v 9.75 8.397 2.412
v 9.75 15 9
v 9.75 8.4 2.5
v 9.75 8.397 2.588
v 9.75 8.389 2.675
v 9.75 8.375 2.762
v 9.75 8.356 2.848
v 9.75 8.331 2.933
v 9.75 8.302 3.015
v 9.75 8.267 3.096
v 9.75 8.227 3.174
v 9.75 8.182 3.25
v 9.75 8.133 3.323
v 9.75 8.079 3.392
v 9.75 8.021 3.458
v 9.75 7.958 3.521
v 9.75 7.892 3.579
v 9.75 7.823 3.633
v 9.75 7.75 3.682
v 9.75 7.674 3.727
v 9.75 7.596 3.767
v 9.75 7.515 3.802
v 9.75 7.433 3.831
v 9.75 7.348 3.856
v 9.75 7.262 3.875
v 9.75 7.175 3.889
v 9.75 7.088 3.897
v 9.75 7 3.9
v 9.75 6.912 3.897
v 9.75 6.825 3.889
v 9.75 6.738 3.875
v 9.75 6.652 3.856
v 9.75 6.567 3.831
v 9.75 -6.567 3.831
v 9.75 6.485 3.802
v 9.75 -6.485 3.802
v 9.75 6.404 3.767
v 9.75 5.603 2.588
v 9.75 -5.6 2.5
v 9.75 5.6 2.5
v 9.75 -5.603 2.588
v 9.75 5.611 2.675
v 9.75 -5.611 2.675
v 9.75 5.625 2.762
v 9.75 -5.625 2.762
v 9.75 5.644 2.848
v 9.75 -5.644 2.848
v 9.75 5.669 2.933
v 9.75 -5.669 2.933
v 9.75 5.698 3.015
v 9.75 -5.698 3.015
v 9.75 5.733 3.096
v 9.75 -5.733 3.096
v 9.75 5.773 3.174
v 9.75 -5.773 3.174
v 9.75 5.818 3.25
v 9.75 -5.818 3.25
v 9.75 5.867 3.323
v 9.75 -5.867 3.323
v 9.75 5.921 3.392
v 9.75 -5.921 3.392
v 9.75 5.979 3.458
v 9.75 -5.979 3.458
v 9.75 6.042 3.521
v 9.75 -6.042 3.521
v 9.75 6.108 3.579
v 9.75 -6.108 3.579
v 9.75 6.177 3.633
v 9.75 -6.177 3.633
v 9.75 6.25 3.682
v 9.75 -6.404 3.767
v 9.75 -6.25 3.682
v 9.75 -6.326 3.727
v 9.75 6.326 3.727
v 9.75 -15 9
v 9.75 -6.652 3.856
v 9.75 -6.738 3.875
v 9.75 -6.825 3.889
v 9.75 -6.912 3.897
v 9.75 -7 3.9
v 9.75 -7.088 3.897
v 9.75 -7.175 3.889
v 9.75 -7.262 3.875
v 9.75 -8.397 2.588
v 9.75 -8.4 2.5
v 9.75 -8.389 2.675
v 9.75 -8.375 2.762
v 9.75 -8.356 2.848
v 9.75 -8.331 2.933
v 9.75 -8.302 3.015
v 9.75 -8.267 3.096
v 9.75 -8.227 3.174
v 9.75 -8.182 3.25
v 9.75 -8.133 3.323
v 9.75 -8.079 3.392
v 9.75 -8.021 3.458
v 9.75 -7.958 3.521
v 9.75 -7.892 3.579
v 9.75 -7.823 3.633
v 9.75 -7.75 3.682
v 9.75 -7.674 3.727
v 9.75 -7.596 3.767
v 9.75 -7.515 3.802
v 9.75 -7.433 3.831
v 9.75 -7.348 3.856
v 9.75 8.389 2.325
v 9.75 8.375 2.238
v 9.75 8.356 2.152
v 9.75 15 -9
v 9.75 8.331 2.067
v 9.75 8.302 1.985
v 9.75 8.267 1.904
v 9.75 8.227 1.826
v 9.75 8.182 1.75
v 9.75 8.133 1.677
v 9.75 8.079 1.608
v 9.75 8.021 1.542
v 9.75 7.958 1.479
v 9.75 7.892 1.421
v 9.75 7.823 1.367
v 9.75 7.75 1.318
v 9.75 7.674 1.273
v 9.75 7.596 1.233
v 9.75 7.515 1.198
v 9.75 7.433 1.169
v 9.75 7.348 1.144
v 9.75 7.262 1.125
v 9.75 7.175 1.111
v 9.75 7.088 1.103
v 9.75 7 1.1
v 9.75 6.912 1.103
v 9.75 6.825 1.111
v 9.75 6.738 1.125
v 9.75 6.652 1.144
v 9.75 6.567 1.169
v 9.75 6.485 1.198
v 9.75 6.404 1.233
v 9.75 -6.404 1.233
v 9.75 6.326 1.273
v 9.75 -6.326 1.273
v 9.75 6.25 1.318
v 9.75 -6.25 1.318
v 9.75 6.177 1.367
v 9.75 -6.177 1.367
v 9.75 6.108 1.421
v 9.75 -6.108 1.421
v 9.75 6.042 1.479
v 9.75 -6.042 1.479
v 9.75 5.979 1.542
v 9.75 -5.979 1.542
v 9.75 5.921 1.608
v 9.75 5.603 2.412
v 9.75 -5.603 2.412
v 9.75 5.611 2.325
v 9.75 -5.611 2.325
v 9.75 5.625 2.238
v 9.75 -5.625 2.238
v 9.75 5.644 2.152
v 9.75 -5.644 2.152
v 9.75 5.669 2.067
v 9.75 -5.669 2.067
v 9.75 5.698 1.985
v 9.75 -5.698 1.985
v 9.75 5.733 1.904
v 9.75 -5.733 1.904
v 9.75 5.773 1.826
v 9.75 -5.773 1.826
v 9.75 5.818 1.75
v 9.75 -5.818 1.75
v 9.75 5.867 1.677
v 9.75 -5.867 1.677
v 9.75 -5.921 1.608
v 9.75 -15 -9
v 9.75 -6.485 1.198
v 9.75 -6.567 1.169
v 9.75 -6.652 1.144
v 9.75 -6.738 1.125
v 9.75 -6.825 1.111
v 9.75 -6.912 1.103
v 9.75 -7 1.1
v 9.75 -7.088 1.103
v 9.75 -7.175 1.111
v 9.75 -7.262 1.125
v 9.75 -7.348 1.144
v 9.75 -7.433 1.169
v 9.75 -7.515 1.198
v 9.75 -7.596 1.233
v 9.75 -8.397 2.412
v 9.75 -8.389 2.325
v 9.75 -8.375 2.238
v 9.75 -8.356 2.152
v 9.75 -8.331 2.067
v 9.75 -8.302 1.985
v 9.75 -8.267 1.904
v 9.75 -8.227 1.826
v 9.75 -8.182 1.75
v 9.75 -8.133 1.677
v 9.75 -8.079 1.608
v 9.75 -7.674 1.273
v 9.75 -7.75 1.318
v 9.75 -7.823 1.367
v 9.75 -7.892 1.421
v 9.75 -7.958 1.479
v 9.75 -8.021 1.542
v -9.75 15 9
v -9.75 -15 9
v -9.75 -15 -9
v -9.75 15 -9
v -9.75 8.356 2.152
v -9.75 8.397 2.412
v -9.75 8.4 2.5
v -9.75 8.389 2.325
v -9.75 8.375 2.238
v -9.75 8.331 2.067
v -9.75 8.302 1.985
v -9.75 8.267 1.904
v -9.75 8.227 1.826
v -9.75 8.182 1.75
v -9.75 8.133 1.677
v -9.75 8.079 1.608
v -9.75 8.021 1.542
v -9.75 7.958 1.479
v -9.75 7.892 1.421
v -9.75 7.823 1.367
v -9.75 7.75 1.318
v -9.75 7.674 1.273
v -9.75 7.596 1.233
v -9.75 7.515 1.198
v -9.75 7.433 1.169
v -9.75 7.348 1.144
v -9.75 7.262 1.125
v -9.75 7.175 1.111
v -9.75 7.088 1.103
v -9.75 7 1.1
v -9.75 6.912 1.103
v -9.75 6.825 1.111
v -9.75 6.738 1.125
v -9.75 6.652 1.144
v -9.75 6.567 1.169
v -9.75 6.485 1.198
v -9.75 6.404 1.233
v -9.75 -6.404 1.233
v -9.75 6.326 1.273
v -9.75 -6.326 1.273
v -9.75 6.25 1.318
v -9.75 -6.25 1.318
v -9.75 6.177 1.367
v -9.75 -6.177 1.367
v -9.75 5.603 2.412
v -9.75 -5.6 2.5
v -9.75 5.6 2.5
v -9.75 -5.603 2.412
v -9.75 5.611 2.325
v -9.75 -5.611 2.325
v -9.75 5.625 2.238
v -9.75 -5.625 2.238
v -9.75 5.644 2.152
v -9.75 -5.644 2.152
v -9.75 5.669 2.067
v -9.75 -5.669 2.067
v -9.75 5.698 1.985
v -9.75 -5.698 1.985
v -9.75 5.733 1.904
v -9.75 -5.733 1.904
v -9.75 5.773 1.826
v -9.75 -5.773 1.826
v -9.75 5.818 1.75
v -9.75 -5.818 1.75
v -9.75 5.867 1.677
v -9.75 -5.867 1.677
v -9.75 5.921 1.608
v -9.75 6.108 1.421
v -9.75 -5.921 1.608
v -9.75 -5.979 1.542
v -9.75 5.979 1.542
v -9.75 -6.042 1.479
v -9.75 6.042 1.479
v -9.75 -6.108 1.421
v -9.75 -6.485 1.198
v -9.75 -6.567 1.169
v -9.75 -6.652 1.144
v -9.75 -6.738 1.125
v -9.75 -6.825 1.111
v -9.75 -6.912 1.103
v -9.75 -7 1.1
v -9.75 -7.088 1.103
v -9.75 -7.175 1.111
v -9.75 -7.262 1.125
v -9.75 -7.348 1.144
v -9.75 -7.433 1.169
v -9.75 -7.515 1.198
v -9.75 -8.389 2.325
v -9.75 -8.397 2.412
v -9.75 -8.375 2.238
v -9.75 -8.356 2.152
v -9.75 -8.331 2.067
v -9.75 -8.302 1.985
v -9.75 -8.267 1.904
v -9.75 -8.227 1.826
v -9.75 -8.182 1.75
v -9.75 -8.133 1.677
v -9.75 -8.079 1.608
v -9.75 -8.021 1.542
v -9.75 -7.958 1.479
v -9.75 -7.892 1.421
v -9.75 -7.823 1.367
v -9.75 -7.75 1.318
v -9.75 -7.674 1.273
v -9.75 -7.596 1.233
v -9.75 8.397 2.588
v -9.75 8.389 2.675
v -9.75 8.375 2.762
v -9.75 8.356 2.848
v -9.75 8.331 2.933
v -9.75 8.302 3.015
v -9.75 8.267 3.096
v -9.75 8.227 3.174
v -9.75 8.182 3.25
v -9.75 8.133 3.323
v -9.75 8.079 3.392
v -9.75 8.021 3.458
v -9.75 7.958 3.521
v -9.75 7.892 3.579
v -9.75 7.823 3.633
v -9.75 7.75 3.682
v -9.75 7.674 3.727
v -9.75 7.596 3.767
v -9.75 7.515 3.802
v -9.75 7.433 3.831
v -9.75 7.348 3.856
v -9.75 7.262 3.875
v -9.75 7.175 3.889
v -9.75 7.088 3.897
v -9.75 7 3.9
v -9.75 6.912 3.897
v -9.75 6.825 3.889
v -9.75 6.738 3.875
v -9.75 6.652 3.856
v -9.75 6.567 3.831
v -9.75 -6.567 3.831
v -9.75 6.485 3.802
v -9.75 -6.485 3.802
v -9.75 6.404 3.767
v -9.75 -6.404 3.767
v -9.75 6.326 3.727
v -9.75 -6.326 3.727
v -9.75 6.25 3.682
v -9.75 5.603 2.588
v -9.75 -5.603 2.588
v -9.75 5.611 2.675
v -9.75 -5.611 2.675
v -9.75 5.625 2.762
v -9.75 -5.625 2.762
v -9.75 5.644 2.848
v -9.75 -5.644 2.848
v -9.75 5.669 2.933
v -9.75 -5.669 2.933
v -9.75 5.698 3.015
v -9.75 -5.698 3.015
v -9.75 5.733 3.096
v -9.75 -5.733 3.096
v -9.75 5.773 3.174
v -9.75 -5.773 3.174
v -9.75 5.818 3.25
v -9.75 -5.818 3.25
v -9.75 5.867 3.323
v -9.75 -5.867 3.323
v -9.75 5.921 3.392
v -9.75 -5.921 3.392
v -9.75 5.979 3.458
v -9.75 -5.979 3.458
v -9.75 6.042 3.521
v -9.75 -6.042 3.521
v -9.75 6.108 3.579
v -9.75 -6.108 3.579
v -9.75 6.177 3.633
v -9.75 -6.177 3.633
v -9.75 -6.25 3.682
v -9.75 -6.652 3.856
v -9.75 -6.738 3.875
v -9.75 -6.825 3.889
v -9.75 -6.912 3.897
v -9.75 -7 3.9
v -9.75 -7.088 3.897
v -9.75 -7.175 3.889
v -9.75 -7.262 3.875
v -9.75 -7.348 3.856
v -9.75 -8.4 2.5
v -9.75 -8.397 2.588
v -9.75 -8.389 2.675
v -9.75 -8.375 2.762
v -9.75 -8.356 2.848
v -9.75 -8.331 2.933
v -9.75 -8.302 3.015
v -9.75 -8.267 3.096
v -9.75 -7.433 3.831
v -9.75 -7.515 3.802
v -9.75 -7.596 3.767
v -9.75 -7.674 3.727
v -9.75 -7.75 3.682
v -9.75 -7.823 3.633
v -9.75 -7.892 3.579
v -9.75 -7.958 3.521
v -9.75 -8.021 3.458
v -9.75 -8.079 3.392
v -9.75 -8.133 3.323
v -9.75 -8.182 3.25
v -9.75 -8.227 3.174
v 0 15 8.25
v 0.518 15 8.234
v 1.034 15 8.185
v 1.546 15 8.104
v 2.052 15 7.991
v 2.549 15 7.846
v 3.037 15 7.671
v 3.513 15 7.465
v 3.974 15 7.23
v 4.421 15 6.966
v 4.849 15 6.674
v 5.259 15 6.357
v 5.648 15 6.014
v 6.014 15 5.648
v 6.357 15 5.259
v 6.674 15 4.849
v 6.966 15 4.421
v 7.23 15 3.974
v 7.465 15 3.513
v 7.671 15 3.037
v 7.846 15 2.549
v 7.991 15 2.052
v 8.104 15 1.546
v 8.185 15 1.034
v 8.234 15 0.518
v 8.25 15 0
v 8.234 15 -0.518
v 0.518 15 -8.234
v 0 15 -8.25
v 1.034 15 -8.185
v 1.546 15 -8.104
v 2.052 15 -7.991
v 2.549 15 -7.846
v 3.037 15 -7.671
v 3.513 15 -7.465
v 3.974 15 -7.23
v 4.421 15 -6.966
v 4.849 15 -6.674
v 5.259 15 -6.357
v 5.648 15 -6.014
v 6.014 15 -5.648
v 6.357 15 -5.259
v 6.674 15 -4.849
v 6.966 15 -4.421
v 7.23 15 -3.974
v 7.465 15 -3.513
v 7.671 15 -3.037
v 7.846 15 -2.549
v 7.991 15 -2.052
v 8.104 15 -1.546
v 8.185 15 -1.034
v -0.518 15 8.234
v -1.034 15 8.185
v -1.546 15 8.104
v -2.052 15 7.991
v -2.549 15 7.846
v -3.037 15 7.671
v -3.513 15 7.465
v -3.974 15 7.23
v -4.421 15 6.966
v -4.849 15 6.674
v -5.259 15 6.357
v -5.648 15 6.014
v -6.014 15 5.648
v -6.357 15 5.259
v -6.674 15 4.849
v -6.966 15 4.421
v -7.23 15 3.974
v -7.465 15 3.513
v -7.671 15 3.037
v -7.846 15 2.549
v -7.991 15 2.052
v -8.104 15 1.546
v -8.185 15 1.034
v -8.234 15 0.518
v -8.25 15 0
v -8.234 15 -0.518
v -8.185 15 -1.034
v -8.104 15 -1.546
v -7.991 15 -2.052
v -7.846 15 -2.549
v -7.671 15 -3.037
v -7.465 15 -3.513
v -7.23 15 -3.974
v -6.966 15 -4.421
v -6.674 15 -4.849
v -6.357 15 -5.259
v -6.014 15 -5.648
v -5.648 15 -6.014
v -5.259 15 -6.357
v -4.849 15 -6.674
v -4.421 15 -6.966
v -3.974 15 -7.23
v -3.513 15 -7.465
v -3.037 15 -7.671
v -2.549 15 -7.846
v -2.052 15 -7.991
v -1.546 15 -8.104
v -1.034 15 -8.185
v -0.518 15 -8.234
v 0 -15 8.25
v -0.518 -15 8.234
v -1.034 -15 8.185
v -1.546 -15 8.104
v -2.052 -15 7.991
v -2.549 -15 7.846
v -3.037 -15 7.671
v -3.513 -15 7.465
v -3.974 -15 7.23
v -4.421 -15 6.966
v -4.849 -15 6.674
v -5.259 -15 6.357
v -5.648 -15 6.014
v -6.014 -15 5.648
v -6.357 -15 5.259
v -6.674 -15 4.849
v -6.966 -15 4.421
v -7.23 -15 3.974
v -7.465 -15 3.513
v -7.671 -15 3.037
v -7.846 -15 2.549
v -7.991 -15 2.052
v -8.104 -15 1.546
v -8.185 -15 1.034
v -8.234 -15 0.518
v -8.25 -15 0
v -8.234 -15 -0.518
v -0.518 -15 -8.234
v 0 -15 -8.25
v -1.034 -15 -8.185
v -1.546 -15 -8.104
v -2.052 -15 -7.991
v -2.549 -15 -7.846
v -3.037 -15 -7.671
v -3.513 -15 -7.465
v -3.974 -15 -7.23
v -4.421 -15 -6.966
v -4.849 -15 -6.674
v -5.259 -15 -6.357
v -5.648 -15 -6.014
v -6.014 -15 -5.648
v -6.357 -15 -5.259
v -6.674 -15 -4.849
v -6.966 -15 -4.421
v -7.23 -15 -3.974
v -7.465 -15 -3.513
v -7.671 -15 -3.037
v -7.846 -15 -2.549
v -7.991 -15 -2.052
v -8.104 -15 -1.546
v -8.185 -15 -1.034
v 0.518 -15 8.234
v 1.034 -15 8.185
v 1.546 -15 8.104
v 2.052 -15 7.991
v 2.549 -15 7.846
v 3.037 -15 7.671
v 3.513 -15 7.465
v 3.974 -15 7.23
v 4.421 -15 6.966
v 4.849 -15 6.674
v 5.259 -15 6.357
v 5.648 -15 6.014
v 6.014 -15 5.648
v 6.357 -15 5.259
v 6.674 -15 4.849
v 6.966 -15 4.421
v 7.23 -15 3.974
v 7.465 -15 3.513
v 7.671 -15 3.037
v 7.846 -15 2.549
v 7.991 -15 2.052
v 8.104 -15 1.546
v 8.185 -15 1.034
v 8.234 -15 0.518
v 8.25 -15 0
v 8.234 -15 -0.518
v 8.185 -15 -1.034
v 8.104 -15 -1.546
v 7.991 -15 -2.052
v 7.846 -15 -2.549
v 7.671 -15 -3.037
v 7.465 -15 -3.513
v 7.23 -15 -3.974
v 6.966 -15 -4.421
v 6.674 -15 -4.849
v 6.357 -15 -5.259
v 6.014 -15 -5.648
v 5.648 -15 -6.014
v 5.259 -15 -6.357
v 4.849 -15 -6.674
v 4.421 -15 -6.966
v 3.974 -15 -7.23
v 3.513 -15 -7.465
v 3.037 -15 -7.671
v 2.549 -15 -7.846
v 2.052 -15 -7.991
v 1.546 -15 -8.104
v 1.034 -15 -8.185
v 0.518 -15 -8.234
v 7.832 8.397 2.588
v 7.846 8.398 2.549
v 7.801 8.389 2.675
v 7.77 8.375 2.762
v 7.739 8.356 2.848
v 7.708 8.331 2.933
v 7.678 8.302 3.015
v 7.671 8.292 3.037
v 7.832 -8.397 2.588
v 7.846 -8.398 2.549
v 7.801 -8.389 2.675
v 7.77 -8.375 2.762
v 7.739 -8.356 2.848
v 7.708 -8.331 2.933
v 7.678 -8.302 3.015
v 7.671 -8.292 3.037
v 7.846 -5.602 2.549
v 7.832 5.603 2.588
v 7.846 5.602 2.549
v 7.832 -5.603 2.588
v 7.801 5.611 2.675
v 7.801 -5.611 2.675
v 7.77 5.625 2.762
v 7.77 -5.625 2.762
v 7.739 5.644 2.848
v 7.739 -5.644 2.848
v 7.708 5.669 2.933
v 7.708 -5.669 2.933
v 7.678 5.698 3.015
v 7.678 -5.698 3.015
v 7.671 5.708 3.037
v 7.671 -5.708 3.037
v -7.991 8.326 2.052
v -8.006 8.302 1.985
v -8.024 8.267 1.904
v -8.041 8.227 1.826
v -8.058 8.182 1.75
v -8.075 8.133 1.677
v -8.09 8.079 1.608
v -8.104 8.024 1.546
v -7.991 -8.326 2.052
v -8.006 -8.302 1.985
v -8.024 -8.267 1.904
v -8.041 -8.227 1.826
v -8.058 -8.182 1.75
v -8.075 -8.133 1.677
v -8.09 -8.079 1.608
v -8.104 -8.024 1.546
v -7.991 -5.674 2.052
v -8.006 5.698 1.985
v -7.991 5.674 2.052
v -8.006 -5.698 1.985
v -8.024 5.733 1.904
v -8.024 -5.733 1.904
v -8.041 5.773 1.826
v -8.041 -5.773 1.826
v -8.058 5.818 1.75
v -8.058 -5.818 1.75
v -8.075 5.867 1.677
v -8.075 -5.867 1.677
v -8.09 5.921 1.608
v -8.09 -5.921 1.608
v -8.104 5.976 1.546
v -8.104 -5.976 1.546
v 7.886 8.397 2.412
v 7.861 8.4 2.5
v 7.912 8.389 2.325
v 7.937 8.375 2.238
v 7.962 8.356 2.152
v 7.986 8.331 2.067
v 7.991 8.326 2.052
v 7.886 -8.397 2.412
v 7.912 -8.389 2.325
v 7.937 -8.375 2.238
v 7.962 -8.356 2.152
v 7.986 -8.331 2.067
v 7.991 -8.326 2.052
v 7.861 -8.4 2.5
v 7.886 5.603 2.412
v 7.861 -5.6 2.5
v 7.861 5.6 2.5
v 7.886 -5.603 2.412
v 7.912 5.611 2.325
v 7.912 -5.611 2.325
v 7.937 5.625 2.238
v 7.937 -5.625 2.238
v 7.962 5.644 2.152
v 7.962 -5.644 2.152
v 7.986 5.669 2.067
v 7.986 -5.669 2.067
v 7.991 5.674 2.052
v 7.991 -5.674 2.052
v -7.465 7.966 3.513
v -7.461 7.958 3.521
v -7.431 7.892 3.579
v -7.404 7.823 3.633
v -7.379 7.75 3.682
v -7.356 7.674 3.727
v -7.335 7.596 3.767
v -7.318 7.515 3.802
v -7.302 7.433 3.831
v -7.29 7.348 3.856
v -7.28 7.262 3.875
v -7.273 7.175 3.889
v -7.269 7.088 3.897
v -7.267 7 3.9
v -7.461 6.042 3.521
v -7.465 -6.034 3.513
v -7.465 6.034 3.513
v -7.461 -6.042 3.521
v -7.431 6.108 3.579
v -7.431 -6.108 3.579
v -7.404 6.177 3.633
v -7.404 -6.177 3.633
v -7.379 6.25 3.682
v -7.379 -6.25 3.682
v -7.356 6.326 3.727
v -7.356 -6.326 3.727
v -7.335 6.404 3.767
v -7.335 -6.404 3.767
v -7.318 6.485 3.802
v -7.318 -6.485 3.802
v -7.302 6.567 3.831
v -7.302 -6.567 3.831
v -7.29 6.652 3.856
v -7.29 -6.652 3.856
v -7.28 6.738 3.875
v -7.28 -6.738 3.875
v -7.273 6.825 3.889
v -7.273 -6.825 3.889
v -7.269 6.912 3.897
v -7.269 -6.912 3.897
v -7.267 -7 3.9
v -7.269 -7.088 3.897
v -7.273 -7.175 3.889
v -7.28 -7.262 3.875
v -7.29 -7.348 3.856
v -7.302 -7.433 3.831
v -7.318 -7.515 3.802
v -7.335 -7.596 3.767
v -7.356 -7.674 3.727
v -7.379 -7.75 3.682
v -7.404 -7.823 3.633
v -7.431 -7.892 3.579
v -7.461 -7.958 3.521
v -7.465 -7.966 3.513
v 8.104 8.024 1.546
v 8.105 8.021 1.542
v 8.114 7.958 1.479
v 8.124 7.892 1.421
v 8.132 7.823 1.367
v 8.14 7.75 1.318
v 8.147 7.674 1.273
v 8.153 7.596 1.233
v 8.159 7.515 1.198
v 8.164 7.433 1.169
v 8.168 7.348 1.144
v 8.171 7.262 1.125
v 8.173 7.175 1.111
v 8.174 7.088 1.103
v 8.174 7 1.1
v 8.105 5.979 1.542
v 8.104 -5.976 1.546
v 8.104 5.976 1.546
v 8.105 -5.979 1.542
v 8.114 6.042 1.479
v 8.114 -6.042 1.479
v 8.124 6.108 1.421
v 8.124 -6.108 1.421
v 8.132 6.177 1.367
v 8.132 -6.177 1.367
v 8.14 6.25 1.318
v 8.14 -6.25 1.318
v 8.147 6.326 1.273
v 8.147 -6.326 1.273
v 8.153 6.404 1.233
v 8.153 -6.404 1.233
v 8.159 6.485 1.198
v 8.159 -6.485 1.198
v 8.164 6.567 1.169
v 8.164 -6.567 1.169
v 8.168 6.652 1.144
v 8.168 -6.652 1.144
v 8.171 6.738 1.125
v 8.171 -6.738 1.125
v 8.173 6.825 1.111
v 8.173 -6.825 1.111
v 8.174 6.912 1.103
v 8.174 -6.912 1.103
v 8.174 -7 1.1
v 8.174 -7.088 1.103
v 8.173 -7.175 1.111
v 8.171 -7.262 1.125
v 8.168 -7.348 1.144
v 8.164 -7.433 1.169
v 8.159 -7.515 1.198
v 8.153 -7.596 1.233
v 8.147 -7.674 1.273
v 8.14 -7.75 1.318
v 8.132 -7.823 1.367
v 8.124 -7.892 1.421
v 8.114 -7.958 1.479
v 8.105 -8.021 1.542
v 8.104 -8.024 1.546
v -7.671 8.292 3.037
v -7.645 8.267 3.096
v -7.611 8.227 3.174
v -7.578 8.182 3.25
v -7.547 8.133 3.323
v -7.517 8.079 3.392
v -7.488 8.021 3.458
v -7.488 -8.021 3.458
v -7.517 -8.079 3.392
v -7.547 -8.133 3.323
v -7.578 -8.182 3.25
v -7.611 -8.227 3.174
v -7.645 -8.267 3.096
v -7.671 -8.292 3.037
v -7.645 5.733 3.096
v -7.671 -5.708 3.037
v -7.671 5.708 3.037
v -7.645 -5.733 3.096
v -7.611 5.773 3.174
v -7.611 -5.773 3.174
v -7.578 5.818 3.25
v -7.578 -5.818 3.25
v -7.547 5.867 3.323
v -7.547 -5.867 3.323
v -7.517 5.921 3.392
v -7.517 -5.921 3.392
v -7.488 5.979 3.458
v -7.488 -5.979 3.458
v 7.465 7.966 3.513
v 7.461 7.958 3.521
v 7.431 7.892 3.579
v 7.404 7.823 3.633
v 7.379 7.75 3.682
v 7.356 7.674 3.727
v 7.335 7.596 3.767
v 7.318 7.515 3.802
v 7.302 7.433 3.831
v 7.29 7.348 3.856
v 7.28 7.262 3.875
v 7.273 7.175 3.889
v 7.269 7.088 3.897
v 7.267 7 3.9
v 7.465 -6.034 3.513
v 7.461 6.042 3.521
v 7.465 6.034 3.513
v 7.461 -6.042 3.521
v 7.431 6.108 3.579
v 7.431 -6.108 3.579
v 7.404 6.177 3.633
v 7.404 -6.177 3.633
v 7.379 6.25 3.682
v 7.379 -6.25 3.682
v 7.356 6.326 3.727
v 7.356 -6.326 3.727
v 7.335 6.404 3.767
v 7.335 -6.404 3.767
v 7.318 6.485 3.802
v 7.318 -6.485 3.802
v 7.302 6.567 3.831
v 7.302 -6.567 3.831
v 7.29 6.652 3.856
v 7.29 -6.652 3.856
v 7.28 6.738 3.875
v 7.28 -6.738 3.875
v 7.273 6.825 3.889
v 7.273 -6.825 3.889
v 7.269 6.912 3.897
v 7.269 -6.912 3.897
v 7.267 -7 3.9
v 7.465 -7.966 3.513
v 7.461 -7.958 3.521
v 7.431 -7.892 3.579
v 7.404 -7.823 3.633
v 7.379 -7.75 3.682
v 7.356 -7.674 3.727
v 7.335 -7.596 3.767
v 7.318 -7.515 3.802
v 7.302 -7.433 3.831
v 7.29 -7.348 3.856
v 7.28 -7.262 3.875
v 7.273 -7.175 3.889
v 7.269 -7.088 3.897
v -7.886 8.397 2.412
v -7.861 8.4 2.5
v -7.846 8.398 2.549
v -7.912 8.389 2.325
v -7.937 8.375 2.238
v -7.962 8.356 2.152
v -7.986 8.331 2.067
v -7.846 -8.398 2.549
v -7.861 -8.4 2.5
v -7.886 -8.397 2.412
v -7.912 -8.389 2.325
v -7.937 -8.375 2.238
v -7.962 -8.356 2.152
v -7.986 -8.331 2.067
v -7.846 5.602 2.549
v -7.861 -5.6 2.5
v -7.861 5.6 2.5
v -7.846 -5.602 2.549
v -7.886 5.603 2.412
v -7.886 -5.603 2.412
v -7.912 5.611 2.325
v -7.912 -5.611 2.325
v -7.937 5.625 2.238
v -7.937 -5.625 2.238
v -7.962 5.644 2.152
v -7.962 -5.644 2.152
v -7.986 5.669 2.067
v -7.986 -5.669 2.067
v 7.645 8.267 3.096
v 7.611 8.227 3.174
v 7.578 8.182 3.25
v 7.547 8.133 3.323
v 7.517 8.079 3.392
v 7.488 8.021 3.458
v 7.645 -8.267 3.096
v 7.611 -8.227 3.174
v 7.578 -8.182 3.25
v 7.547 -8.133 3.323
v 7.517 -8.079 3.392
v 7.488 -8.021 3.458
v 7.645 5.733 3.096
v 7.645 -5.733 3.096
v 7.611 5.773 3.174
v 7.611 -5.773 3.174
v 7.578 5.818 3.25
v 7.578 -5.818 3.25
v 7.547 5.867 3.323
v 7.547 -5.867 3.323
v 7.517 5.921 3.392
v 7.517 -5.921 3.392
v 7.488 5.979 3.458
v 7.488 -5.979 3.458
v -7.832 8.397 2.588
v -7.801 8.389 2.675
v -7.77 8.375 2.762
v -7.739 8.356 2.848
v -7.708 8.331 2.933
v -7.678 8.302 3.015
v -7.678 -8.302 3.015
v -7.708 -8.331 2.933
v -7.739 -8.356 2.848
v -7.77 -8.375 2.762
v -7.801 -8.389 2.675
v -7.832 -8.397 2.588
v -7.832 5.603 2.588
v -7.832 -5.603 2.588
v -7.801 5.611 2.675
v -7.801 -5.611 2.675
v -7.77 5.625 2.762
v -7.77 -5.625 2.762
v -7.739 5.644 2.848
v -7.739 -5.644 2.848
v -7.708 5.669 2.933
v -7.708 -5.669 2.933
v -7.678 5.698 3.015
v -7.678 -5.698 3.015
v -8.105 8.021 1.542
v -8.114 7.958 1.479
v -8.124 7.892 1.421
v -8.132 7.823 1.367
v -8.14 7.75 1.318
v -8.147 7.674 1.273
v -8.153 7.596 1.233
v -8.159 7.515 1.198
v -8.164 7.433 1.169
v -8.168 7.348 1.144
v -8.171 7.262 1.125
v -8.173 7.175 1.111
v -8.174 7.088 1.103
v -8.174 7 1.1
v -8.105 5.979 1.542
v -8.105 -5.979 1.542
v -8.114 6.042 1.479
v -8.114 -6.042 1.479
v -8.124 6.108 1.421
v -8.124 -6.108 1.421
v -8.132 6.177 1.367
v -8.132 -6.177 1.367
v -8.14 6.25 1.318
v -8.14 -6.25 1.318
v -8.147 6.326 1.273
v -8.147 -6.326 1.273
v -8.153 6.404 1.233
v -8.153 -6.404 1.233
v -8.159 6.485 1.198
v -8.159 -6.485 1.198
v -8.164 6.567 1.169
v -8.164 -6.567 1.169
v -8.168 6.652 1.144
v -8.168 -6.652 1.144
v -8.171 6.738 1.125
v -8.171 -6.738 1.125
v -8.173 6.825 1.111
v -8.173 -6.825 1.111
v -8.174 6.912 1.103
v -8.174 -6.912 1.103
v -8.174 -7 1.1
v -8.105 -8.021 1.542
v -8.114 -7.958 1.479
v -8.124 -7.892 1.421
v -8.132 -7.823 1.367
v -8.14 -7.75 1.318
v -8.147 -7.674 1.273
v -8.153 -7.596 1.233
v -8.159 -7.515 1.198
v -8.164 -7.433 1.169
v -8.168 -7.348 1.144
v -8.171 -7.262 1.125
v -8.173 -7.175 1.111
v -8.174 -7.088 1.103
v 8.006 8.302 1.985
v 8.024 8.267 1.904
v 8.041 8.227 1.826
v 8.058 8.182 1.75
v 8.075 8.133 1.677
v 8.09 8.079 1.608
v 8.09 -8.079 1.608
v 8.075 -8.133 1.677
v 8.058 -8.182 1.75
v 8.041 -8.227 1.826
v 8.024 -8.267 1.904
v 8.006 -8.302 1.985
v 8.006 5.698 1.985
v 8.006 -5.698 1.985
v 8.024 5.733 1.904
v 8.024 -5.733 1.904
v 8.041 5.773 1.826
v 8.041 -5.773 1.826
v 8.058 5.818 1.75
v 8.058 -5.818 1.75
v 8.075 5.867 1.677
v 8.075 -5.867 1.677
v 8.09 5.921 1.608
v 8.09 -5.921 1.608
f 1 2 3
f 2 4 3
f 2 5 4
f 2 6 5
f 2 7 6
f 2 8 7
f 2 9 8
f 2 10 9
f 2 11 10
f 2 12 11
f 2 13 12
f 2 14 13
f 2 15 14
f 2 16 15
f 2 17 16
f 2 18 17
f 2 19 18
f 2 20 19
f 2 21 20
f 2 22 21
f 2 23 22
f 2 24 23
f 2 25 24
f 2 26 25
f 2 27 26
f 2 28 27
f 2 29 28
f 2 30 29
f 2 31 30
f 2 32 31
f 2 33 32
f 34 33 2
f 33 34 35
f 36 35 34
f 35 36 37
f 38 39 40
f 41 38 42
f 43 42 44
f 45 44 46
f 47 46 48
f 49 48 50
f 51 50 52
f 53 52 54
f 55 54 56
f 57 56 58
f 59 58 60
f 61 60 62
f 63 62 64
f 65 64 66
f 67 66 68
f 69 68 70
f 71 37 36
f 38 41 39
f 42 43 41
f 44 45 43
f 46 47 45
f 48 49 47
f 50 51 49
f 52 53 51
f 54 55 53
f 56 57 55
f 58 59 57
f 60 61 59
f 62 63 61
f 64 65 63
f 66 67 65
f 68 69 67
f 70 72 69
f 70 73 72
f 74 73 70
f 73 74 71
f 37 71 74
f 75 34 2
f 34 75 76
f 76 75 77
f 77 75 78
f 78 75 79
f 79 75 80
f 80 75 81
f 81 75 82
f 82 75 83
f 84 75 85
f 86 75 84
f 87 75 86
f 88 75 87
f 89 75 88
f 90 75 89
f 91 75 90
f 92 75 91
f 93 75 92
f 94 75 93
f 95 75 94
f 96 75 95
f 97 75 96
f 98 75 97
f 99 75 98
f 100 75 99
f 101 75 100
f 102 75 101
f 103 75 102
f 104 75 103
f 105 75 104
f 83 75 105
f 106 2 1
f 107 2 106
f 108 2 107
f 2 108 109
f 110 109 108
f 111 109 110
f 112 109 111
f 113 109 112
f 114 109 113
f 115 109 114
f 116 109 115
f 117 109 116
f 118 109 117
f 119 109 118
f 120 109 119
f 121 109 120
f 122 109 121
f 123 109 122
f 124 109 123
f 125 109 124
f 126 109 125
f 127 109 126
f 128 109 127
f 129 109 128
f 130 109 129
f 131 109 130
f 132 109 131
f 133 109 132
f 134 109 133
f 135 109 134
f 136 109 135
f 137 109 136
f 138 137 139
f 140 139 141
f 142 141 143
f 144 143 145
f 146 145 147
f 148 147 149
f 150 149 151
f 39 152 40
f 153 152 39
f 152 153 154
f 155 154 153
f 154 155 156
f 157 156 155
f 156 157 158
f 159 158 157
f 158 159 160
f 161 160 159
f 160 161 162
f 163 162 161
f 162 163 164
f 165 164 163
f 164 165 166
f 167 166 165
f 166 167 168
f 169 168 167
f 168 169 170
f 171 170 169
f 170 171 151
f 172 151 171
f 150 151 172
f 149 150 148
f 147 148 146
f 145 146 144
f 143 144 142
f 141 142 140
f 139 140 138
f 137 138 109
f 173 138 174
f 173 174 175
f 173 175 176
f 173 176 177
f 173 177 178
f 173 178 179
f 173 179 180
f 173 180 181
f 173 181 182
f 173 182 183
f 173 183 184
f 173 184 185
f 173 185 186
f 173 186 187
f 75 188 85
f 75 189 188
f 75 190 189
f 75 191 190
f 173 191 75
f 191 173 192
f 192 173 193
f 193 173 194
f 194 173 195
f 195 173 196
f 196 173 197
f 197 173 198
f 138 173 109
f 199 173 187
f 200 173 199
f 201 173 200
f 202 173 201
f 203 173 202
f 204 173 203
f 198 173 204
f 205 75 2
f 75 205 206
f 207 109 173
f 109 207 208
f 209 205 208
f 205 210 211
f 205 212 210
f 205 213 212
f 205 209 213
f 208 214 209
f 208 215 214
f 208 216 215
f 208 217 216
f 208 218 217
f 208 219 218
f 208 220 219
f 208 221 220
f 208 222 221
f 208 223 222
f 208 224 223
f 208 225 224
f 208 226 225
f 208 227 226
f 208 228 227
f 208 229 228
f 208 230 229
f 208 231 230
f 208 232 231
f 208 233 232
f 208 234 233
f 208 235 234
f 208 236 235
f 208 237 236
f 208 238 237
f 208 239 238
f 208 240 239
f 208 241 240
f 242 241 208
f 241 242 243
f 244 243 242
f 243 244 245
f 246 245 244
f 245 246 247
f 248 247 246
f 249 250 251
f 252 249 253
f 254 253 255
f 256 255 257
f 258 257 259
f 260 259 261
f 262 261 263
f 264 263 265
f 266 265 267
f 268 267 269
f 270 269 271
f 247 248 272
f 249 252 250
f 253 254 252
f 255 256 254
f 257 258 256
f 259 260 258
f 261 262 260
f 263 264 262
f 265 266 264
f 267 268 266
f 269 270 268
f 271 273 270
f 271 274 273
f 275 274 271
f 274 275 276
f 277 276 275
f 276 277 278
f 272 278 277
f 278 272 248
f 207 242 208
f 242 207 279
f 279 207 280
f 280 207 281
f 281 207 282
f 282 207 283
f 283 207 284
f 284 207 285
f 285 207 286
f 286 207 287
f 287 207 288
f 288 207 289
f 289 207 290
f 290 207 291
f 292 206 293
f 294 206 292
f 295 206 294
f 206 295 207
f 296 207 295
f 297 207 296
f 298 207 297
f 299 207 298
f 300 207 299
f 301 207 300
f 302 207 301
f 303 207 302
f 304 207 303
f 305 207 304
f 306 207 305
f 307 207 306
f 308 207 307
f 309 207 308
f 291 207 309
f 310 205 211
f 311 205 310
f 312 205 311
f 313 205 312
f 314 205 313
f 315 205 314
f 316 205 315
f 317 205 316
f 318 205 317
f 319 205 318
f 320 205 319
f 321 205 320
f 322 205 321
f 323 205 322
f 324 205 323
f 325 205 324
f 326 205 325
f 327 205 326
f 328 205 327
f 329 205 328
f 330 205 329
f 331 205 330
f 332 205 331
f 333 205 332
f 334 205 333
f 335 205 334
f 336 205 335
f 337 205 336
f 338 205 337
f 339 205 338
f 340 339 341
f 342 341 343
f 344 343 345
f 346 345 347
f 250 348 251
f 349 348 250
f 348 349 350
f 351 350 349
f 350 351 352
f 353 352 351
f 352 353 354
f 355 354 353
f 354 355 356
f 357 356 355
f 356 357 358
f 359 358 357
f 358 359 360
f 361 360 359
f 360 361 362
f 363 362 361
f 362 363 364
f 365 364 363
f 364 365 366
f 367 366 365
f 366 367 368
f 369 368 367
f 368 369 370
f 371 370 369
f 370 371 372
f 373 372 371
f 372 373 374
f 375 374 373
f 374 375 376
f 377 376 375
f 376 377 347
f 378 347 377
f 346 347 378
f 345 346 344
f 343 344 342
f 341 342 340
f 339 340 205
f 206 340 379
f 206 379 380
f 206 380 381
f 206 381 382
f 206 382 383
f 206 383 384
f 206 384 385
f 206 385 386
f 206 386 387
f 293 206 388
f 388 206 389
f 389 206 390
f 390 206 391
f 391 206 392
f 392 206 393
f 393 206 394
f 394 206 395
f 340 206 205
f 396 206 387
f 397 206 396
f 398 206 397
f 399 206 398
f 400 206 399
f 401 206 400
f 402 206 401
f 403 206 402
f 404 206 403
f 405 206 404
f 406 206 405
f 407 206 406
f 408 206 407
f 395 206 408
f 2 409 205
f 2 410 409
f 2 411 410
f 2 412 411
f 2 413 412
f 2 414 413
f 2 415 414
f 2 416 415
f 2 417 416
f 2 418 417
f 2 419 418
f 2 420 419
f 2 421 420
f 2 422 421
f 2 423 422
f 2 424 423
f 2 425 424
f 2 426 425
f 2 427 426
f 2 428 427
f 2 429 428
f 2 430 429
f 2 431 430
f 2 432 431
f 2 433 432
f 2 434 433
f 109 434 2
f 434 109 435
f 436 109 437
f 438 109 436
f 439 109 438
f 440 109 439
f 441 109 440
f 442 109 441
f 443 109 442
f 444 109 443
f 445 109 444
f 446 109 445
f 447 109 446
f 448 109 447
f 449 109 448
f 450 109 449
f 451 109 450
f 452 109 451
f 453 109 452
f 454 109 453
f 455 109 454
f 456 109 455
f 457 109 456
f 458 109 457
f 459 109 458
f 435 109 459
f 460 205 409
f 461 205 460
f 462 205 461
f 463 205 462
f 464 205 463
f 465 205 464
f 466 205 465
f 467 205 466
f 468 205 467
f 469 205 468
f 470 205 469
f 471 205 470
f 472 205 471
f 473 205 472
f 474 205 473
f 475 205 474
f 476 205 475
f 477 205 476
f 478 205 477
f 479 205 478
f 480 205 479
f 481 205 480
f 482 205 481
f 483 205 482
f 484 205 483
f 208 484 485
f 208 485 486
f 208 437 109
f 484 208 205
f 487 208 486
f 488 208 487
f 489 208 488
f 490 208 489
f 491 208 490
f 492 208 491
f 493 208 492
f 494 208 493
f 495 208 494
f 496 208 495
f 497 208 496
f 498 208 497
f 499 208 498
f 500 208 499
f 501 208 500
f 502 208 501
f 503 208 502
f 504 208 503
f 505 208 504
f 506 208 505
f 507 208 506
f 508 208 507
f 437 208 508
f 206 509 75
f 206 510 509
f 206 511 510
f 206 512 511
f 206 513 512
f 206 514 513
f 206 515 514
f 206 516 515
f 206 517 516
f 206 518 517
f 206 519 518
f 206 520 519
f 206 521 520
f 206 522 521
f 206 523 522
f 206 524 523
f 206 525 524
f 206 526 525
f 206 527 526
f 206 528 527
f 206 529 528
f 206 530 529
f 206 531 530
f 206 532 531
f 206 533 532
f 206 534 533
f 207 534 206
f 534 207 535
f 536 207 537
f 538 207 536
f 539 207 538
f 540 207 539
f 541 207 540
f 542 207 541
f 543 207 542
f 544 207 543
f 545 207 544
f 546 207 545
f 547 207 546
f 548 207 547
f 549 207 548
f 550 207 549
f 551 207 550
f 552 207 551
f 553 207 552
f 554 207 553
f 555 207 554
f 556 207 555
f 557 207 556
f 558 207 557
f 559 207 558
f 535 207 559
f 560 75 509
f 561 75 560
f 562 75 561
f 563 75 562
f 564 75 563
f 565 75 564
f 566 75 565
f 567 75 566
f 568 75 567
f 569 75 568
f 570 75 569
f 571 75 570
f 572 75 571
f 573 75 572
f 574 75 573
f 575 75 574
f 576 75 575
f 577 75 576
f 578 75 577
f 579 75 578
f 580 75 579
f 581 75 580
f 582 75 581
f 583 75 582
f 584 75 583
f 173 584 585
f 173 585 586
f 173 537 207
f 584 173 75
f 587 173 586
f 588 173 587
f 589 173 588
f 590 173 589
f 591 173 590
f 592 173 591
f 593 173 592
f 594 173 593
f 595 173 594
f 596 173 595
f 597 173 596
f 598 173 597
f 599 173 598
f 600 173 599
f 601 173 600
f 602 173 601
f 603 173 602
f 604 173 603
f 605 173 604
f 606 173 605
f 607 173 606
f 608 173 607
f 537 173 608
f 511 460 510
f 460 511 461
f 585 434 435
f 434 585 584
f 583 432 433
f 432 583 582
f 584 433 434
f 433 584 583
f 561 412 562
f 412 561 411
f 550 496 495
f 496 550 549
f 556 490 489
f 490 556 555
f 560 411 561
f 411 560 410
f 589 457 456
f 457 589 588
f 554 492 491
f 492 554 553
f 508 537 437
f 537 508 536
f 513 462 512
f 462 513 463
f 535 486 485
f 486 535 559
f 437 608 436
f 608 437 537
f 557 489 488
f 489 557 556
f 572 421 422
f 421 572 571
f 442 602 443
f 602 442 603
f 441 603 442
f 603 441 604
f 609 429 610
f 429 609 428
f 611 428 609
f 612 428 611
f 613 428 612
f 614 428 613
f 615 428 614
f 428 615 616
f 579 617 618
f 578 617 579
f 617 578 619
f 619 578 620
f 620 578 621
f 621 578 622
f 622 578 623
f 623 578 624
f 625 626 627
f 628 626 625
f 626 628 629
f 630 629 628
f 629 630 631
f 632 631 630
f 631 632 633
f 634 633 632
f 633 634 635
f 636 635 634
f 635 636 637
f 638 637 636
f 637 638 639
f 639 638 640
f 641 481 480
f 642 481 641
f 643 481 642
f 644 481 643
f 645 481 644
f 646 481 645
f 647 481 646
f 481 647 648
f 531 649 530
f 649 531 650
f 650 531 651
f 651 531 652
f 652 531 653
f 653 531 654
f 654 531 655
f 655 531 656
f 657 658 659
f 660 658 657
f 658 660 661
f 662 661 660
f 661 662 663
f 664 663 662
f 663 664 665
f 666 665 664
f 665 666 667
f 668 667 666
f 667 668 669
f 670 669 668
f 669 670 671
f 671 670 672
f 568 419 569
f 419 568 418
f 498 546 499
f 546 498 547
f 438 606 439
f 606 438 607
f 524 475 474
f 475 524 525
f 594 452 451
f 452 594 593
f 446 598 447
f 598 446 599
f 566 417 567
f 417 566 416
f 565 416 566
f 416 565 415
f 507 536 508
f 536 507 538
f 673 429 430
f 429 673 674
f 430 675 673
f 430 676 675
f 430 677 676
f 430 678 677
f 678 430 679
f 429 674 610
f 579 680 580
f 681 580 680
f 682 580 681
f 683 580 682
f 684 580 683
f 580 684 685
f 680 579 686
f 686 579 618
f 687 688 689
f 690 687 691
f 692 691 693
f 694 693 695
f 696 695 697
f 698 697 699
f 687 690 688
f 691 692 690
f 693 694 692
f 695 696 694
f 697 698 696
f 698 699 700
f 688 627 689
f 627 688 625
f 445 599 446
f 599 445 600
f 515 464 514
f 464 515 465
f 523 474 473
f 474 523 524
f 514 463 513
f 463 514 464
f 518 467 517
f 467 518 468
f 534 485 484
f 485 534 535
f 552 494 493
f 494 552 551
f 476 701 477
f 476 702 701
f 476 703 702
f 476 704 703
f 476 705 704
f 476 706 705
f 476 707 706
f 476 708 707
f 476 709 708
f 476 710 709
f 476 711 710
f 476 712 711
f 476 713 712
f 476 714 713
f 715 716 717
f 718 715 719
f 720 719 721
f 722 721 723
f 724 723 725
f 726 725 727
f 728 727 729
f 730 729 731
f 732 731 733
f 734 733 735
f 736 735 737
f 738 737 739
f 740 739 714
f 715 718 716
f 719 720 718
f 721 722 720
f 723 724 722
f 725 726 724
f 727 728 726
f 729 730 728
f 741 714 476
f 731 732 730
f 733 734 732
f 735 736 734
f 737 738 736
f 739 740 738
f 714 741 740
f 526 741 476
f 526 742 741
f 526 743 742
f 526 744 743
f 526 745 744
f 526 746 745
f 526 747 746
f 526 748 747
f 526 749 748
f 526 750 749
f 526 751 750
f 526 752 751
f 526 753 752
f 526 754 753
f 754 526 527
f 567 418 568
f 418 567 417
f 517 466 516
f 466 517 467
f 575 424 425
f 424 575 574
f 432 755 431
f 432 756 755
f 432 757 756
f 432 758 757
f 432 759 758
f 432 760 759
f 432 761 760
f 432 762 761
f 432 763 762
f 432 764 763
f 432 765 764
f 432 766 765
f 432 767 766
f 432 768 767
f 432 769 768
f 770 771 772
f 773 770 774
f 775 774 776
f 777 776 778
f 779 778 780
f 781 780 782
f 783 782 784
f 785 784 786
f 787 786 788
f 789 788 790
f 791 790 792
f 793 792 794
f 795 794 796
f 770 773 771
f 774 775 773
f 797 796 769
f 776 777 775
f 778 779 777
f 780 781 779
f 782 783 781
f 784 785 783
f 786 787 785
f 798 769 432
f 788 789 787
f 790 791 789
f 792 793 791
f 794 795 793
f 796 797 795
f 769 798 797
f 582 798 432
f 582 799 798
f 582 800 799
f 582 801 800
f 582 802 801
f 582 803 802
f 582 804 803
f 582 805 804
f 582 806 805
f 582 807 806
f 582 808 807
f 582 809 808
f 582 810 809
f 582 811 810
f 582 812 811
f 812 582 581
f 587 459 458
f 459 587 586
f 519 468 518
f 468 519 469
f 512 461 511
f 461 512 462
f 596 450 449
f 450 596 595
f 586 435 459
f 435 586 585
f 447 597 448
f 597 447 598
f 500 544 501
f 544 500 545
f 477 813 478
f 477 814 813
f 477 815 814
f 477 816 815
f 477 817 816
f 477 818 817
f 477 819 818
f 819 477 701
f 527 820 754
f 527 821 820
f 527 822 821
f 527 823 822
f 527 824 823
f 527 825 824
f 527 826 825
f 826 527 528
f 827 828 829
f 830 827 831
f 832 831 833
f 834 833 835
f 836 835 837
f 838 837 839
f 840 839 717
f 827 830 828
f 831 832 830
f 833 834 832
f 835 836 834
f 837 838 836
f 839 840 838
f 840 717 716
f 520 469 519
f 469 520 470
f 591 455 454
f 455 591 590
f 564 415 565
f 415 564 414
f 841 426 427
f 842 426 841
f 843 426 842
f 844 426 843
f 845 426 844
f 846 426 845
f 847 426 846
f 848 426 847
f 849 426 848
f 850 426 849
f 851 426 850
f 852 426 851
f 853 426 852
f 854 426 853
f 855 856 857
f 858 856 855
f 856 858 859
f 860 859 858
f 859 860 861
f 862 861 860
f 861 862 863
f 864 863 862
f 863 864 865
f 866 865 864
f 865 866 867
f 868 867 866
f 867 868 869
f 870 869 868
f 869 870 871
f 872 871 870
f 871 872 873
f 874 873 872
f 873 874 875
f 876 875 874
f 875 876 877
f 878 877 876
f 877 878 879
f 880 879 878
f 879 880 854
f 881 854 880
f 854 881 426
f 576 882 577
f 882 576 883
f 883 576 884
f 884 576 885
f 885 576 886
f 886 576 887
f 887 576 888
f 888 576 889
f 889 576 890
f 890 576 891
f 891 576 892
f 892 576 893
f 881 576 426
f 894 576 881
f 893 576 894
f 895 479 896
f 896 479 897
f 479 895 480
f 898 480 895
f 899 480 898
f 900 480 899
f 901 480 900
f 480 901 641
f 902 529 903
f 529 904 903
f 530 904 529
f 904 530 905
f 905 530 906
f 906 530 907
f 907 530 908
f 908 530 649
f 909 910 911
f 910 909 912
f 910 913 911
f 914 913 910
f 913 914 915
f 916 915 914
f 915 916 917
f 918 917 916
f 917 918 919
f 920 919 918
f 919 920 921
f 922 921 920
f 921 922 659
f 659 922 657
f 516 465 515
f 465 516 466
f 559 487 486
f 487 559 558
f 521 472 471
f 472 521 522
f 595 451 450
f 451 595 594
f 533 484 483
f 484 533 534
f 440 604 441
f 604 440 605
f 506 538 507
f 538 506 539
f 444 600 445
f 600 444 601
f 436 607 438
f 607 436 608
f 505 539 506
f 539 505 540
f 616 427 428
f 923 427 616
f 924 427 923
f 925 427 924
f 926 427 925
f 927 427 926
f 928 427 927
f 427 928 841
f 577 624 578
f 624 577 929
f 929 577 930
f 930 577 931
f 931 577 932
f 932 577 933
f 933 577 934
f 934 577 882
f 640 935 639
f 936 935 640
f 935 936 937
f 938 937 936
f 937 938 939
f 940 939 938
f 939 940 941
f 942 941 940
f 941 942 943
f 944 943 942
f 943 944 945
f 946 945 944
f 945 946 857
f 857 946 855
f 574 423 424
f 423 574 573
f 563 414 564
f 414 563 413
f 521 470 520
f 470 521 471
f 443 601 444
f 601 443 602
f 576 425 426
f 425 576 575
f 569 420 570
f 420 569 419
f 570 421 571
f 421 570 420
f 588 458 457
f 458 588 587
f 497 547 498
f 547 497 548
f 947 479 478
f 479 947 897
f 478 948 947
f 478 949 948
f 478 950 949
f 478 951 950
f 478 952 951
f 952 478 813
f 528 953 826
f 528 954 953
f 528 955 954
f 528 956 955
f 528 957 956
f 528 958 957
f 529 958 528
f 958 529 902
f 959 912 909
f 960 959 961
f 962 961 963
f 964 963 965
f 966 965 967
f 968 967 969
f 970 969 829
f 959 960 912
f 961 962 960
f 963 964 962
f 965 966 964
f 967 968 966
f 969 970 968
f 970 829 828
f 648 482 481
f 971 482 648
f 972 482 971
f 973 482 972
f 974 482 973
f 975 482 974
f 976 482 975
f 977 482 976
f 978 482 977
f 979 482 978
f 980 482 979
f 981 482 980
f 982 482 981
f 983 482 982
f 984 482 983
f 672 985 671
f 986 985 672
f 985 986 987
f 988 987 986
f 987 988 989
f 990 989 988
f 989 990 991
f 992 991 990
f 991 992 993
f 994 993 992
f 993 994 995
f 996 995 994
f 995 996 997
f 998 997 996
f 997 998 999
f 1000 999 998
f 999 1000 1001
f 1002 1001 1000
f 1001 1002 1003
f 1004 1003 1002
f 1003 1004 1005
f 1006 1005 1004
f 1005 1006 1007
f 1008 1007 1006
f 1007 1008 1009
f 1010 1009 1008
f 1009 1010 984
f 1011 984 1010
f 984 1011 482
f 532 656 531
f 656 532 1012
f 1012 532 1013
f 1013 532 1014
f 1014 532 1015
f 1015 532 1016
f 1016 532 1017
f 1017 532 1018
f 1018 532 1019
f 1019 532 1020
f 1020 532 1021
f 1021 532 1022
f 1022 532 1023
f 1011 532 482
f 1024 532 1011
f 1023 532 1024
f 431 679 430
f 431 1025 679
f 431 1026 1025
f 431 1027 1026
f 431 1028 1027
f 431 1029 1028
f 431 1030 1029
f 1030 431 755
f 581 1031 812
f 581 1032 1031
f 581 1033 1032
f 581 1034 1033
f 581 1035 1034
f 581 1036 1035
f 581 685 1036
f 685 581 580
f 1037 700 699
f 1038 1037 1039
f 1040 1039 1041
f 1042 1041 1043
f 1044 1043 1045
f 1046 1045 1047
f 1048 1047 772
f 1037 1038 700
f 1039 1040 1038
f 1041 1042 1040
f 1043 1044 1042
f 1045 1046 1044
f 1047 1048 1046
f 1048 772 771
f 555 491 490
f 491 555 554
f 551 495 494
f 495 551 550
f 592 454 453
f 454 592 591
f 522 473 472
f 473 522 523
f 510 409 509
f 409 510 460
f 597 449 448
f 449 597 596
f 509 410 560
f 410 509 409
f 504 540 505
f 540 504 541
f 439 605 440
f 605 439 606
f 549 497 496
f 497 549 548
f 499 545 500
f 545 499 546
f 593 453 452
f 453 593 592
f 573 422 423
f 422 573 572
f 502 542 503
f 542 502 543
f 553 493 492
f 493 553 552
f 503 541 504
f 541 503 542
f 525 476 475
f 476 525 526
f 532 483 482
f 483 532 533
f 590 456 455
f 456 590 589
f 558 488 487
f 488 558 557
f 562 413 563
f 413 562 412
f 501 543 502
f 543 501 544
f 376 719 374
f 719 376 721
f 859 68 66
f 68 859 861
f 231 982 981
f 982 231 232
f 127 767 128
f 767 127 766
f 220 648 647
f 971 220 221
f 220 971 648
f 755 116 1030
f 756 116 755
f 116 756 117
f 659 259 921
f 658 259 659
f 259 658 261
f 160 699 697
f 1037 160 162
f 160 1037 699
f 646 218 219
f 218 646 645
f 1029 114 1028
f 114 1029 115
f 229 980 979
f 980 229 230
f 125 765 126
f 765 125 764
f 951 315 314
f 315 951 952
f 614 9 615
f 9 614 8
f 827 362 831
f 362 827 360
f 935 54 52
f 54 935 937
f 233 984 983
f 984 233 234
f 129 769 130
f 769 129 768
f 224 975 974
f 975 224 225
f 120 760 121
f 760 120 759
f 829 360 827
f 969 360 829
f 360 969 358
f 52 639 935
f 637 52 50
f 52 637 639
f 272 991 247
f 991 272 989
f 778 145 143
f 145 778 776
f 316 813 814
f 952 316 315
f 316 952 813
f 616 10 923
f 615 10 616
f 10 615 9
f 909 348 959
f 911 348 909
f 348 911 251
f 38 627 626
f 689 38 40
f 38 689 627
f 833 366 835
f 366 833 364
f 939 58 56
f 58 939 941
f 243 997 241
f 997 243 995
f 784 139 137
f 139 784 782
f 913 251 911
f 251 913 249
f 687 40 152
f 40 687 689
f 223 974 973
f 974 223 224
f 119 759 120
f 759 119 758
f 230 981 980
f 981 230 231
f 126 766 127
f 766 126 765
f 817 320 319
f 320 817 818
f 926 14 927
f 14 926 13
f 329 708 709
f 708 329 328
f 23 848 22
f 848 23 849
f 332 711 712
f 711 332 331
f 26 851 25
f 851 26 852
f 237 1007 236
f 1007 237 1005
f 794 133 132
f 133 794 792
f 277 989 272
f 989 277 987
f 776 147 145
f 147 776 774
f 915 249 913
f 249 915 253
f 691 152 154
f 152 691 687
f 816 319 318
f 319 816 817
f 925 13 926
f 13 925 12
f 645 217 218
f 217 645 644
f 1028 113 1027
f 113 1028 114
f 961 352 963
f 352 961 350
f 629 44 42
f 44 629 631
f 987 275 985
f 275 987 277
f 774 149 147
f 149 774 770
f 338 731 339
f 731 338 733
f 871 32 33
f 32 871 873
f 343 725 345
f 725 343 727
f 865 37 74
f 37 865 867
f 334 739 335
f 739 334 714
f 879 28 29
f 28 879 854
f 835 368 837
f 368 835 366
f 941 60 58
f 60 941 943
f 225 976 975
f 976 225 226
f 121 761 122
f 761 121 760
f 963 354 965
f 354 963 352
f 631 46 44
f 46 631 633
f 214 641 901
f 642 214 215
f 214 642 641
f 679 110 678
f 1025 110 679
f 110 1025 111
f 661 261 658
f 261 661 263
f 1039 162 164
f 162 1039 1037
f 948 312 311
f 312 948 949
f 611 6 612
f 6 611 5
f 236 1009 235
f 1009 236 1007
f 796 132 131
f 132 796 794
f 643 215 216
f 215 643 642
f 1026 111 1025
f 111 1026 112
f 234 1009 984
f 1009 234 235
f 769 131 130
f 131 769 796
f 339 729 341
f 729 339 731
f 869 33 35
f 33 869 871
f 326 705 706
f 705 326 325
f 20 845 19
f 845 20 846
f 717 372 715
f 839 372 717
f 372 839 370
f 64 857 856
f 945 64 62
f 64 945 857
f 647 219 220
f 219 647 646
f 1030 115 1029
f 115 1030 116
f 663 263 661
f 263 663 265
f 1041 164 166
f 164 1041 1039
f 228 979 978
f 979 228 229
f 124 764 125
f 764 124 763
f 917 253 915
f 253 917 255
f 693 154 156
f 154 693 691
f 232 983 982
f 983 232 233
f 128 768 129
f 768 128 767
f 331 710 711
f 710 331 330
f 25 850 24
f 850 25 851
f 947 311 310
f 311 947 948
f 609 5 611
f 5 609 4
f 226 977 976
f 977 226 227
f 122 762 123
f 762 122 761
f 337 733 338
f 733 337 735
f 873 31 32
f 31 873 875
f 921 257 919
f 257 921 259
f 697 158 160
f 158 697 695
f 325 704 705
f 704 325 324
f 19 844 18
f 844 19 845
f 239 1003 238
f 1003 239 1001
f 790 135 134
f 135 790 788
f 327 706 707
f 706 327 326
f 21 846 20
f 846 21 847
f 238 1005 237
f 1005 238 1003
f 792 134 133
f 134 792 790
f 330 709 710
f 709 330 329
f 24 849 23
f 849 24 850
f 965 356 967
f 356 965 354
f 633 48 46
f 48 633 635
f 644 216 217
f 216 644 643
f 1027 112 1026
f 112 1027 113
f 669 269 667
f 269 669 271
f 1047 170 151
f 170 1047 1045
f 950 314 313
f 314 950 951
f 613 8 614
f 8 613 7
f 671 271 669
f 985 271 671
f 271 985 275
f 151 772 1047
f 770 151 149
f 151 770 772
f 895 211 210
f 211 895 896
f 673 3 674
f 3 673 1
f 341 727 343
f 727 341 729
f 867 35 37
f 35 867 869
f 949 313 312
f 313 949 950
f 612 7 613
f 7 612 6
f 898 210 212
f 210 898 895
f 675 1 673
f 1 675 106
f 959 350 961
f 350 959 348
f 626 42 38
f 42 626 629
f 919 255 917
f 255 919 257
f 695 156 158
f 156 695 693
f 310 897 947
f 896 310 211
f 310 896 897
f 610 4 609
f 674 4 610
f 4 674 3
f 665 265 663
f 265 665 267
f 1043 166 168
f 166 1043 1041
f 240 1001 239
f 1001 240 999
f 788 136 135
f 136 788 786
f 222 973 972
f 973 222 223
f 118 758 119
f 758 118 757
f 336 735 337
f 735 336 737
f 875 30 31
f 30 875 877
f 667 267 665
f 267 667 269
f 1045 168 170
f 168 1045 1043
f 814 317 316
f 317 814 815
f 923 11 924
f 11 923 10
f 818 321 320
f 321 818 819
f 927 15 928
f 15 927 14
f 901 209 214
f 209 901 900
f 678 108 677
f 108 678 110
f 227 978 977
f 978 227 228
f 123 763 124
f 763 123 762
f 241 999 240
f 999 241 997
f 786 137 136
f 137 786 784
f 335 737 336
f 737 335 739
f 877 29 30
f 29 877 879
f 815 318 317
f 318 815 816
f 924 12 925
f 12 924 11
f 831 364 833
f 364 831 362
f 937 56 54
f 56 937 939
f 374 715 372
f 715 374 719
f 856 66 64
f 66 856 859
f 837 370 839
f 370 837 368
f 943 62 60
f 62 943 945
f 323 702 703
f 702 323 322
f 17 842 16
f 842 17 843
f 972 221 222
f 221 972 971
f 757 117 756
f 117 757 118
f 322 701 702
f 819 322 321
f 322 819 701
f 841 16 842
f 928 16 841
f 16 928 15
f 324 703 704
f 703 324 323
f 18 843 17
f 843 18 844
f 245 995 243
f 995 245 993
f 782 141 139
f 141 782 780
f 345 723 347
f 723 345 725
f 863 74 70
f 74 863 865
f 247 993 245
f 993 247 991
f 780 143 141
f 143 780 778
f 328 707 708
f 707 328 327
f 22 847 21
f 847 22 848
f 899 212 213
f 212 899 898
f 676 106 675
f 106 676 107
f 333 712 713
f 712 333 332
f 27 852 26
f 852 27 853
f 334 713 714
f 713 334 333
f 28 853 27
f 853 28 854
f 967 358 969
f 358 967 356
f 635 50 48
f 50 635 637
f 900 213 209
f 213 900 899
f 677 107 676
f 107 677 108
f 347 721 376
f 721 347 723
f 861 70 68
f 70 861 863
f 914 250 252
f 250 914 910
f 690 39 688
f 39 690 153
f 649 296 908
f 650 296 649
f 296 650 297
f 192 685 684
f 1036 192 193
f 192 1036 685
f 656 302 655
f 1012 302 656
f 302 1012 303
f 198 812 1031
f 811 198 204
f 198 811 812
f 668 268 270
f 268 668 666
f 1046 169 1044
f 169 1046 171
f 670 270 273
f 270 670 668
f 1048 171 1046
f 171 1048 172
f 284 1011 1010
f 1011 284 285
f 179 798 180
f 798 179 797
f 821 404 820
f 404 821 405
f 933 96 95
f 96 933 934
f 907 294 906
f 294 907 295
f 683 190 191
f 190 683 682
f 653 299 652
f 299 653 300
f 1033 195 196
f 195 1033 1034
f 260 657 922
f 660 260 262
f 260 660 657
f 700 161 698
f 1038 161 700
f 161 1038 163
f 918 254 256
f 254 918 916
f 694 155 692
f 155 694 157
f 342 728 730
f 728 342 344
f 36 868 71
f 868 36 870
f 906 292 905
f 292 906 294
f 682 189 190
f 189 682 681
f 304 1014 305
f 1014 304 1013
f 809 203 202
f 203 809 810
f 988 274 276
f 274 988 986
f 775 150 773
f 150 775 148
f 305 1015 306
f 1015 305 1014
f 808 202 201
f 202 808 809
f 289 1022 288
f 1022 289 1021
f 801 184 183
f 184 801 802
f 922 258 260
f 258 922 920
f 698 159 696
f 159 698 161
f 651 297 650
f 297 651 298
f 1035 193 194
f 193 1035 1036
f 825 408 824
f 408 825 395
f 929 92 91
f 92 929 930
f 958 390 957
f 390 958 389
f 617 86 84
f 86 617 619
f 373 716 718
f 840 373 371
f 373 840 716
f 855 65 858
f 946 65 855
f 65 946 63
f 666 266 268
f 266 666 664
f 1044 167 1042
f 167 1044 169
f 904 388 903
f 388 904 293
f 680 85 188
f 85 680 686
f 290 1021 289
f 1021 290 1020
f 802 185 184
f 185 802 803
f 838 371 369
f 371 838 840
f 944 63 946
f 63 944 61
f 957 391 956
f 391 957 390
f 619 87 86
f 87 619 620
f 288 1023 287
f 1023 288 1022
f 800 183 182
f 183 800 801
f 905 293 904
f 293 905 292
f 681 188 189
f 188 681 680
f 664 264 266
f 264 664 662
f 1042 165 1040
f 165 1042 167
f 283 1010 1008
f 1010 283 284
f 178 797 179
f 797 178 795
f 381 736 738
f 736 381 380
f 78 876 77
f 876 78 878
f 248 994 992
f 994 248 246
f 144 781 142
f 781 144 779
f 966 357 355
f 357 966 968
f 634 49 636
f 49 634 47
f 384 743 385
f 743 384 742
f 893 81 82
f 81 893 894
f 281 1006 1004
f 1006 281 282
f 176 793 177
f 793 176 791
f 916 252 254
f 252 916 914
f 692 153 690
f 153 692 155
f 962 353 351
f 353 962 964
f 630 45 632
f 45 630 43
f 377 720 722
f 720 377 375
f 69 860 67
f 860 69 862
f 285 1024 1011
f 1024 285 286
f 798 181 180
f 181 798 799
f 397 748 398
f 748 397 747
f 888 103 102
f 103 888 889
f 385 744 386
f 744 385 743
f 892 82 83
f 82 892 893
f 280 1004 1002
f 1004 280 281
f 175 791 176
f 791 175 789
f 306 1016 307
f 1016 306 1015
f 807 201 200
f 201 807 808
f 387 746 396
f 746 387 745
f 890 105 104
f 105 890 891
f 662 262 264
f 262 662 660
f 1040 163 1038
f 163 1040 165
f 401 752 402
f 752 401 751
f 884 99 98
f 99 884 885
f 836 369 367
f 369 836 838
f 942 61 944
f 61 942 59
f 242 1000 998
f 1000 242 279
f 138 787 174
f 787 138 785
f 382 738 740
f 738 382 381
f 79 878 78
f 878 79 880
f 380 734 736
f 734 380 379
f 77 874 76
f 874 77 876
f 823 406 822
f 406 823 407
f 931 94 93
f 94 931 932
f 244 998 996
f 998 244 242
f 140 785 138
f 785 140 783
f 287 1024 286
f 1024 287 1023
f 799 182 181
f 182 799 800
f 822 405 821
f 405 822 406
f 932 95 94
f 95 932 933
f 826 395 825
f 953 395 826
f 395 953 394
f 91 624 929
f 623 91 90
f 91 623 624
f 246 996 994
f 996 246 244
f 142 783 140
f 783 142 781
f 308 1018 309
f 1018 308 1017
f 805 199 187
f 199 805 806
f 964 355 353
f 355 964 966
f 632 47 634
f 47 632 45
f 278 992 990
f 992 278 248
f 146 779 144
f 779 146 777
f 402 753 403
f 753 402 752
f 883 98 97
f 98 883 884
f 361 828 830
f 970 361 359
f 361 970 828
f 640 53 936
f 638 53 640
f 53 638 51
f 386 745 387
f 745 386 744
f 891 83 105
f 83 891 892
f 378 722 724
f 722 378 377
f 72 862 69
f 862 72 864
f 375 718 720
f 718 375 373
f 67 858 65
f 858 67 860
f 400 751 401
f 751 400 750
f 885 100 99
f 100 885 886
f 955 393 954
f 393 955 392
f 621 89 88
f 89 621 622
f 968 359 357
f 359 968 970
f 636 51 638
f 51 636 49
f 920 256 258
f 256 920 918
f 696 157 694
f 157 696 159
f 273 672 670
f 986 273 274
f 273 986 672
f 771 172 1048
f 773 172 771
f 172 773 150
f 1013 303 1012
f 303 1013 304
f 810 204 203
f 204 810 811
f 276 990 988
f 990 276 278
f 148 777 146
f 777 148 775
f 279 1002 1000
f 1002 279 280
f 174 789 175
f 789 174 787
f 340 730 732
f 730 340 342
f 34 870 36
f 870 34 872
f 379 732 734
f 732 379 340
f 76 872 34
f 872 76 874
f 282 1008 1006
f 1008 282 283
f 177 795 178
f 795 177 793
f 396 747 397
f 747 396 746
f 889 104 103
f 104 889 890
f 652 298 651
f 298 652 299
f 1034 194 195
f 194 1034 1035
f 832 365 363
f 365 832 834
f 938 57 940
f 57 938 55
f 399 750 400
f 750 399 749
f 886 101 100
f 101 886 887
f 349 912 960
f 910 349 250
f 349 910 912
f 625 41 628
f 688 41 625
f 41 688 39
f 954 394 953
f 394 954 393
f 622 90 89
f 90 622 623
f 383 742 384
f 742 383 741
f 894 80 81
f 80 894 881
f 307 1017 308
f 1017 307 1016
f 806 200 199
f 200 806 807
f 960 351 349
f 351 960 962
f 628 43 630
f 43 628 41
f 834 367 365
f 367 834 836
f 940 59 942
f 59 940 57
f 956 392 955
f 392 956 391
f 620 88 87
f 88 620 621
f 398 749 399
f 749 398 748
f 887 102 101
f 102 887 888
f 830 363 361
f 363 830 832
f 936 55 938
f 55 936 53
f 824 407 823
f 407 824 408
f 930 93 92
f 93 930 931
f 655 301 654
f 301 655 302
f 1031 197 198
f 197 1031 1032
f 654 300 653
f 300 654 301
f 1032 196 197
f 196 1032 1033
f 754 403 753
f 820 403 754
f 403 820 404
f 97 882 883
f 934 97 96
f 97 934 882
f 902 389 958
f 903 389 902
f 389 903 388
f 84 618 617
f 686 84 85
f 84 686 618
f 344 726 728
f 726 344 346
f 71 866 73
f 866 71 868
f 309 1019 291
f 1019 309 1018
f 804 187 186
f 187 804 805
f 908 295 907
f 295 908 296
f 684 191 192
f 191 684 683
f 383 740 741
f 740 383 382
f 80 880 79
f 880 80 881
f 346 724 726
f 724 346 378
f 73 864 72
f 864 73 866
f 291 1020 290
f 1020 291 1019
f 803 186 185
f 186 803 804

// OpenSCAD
// --- MEASURE YOUR BRASS FITTING ---
nozzle_barrel_dia = 16.5;    // Diameter of the round threaded part

// --- MOUNTING SETTINGS ---
// 2.8mm is tight for M3, allowing the screw to cut its own threads into the plastic.
// If it's too hard to screw in, drill it out slightly to 3.0mm.
mount_screw_dia = 2.8;     
hole_spacing = 14;         // Distance between the two mounting holes
whole_offset = 2.5;      // Offset to the wall

$fn=100;

difference() {
    // 1. The Main Block
    cube([nozzle_barrel_dia + 3, 30, nozzle_barrel_dia + 1.5], center=true);


    // 3. The Barrel Exit (Where water comes out)
    rotate([90, 0, 0])
        translate([0, 0, -10])
            cylinder(h=20, d=nozzle_barrel_dia, center=true);
            
    // 4. The Hose Entrance (Rear)
    rotate([90, 0, 0])
        translate([0, 0, 10])
            cylinder(h=30, d=nozzle_barrel_dia, center=true);

    // 5. Fixed Mounting Holes (13mm spacing)
    // Top Hole
    translate([0, hole_spacing/2, whole_offset]) 
        rotate([0, 90, 0]) 
            cylinder(h=30, d=mount_screw_dia, center=true);
            
    // Bottom Hole
    translate([0, -hole_spacing/2, whole_offset]) 
        rotate([0, 90, 0]) 
            cylinder(h=30, d=mount_screw_dia, center=true);
}
